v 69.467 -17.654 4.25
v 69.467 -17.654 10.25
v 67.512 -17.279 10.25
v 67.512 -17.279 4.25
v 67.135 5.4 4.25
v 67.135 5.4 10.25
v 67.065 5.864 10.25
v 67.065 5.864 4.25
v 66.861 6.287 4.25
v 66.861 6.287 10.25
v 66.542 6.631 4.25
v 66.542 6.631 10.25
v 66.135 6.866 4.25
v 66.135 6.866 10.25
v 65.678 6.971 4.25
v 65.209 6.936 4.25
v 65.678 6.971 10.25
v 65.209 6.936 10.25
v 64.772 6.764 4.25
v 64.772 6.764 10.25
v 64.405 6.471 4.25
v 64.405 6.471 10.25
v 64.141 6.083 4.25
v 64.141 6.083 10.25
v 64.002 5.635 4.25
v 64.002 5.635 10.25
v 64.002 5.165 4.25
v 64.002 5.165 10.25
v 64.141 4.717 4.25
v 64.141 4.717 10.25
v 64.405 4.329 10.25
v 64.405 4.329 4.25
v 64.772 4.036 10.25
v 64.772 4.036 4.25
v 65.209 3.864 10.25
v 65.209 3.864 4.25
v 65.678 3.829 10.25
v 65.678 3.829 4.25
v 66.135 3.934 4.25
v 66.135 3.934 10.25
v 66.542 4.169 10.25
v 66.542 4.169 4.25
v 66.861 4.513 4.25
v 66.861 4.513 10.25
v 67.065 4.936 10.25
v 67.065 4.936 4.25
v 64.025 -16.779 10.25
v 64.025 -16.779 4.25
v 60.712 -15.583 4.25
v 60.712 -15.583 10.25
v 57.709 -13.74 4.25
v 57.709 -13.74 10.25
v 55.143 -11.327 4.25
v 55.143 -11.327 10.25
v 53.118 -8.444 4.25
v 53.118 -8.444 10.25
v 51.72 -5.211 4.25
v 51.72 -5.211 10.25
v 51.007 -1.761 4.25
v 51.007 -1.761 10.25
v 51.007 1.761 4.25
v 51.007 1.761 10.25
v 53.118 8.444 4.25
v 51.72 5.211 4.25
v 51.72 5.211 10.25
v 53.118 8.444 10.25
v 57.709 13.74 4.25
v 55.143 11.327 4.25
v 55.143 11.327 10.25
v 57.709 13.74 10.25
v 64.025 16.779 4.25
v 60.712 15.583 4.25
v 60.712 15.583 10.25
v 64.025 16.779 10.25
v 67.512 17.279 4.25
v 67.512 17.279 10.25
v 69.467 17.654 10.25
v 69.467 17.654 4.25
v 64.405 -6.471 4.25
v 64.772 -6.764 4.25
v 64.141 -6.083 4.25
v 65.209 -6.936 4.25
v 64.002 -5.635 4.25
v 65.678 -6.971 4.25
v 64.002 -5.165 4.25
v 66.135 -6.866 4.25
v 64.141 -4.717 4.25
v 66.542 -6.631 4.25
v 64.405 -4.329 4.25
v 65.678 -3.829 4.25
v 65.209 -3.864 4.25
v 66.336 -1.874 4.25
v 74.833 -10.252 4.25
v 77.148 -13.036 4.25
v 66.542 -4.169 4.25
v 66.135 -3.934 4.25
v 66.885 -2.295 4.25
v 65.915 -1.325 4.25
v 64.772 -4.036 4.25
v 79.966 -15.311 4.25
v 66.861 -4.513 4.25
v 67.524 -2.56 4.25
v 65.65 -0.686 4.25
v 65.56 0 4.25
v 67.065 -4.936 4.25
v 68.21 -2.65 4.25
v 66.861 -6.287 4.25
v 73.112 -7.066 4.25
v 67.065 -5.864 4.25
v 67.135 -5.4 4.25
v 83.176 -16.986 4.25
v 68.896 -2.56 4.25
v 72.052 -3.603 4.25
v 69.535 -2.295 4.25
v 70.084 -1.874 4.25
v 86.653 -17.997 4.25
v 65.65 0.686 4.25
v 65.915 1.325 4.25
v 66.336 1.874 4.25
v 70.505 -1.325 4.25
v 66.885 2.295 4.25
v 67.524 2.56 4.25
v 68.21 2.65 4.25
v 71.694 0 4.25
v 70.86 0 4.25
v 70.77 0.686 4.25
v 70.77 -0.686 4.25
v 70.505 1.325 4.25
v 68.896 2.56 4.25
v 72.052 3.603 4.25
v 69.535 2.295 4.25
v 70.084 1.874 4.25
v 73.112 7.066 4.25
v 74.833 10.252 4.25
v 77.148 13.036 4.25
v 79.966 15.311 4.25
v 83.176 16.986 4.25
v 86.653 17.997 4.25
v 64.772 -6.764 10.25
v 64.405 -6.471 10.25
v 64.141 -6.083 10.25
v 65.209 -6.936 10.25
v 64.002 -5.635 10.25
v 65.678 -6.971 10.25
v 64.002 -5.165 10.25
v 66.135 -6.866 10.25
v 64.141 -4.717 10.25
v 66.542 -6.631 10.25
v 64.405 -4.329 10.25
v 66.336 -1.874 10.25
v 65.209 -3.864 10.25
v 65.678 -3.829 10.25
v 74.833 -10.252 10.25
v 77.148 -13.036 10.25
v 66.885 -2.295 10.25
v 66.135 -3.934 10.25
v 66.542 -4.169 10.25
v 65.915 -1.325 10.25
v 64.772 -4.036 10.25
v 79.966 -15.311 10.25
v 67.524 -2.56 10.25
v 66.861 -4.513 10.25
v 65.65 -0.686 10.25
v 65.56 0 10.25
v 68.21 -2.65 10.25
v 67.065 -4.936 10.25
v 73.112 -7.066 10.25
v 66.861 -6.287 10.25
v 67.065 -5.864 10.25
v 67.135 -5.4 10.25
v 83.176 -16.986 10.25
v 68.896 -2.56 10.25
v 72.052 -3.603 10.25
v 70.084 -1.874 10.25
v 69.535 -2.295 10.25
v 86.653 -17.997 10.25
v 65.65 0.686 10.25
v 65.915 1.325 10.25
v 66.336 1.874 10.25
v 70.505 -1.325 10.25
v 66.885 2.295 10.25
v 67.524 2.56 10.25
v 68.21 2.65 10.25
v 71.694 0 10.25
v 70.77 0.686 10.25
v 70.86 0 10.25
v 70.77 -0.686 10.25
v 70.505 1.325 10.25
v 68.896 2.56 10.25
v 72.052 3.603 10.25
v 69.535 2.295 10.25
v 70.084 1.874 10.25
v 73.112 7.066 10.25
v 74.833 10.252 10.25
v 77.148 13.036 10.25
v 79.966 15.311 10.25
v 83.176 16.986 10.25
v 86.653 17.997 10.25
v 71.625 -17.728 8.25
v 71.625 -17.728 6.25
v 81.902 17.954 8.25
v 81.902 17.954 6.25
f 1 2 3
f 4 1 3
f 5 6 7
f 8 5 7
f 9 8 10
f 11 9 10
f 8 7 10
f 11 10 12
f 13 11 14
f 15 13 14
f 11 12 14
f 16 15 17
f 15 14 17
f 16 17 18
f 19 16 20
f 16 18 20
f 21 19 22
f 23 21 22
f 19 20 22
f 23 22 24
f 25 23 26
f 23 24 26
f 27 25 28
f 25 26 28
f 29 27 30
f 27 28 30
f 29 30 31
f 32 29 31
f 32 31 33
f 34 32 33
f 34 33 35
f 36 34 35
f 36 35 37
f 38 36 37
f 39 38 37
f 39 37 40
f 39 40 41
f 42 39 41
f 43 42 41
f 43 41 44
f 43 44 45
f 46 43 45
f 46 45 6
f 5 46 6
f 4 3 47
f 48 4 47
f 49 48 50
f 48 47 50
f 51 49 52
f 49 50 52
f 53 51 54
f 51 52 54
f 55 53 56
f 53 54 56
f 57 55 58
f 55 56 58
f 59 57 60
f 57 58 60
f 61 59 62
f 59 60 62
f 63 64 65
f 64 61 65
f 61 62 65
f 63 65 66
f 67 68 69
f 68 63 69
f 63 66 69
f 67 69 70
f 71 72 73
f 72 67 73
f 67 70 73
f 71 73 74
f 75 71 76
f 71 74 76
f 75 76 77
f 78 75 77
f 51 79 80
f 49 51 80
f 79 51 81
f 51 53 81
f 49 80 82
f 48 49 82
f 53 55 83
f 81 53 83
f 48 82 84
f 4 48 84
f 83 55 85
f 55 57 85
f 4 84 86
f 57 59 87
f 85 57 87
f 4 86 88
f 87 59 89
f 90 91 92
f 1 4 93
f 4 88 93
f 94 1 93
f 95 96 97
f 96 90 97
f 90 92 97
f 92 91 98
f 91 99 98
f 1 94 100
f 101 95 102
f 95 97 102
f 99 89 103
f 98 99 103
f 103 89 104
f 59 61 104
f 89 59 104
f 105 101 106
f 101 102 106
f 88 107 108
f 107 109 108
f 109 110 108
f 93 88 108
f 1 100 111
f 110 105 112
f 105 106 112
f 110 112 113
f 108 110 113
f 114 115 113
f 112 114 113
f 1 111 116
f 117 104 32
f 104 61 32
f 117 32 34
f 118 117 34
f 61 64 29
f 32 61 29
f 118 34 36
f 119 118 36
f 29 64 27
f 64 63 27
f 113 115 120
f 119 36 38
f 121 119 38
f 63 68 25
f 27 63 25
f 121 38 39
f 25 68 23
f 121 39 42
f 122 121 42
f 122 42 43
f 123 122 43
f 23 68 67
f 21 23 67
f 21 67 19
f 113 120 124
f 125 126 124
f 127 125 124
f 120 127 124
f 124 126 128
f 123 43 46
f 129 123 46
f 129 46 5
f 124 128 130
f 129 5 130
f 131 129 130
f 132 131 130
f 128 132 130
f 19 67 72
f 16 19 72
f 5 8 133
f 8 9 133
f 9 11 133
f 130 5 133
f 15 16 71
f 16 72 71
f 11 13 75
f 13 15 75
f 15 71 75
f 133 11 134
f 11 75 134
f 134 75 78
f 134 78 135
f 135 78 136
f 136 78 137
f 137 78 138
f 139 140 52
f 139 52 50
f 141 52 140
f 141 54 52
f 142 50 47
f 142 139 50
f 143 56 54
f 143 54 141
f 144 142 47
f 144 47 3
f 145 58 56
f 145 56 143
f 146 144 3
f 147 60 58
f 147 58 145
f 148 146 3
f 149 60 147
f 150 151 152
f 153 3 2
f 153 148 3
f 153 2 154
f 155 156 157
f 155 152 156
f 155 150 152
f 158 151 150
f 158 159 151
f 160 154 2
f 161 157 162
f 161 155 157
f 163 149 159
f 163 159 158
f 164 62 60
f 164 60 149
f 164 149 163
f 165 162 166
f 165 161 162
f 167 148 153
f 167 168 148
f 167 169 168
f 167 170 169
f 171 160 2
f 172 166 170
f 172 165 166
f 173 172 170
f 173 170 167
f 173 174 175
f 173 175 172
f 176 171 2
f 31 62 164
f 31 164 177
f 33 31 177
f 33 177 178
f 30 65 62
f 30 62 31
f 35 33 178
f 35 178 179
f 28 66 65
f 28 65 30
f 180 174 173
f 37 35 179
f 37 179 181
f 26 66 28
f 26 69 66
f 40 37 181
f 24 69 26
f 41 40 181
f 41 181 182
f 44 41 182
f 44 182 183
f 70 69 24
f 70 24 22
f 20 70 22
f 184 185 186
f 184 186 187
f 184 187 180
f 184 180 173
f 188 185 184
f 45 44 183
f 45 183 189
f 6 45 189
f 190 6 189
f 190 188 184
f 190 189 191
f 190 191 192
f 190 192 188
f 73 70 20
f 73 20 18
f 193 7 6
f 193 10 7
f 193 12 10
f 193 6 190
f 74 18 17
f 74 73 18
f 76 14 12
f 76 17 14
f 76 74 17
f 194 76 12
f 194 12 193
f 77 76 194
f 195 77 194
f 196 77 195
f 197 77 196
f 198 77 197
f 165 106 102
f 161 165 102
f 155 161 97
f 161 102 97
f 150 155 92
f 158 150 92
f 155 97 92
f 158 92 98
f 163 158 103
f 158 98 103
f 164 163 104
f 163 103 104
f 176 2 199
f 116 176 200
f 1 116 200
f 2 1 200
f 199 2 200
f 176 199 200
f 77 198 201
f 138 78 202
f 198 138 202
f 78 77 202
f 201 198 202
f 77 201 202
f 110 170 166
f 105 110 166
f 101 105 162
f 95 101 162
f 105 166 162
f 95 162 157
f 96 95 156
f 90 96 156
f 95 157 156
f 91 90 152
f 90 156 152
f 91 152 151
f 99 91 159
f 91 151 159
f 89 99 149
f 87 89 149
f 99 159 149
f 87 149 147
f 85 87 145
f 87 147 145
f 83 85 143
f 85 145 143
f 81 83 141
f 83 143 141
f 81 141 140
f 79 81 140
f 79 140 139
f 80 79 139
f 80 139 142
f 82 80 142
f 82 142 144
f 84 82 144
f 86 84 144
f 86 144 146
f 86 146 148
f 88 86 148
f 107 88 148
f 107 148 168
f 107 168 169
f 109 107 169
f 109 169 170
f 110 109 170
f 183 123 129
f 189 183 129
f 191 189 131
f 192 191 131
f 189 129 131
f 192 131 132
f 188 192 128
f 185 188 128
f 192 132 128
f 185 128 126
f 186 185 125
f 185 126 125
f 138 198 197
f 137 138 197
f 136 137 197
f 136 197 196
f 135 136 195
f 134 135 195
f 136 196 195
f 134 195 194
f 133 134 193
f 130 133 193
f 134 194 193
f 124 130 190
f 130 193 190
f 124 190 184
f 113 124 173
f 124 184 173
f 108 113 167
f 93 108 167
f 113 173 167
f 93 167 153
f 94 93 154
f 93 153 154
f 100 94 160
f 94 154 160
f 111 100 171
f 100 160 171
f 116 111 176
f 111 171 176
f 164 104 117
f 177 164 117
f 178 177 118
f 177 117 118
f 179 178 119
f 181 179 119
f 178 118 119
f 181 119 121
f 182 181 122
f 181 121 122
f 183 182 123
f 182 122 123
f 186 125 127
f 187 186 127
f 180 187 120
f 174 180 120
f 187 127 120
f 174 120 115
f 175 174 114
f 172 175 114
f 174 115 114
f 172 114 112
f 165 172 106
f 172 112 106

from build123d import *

# Parameters (mm, degrees)
BOSS_EXTRUDE5_START = 4.25
BOSS_EXTRUDE5_DEPTH = 6
CUT_EXTRUDE2_DEPTH  = 92.979276087
SKETCH4_R           = 1.575
CUT_EXTRUDE3_DEPTH  = 10


with BuildPart() as part:
    # Sketch2 → Boss-Extrude5 (new body)
    with BuildSketch(Plane.XY.offset(BOSS_EXTRUDE5_START)):
        with BuildLine():
            ThreePointArc((68.209851787, 17.593254842), (67.854853617, 17.589672886), (67.5, 17.578928476))
            ThreePointArc((67.5, 17.578928476), (61.469163108, 16.250714817), (56.268821721, 12.920310248))
            ThreePointArc((56.268821721, 12.920310248), (61.039234507, 7.227490774), (62.750493933, 0))
            Line((62.750493933, 0), (65.559851787, 0))
            ThreePointArc((65.559851787, 0), (66.336018817, 1.87383297), (68.209851787, 2.65))
            Line((68.209851787, 2.65), (68.209851787, 17.593254842))
        make_face()
        with BuildLine():
            ThreePointArc((56.268821721, -12.920310248), (61.469163108, -16.250714817), (67.5, -17.578928476))
            ThreePointArc((67.5, -17.578928476), (67.854853617, -17.589672886), (68.209851787, -17.593254842))
            Line((68.209851787, -17.593254842), (68.209851787, -2.65))
            ThreePointArc((68.209851787, -2.65), (66.336018817, -1.87383297), (65.559851787, 0))
            Line((65.559851787, 0), (62.750493933, 0))
            ThreePointArc((62.750493933, 0), (61.039234507, -7.227490774), (56.268821721, -12.920310248))
        make_face()
        with BuildLine():
            ThreePointArc((62.750493933, 0), (61.039234507, 7.227490774), (56.268821721, 12.920310248))
            ThreePointArc((56.268821721, 12.920310248), (52.091474062, 7.051277576), (50.616596945, 0))
            Line((50.616596945, 0), (62.750493933, 0))
        make_face()
        with BuildLine():
            ThreePointArc((50.616596945, 0), (52.091474062, -7.051277576), (56.268821721, -12.920310248))
            ThreePointArc((56.268821721, -12.920310248), (61.039234507, -7.227490774), (62.750493933, 0))
            Line((62.750493933, 0), (50.616596945, 0))
        make_face()
        with BuildLine():
            ThreePointArc((62.750493933, 0), (61.039234507, 7.227490774), (56.268821721, 12.920310248))
            ThreePointArc((56.268821721, 12.920310248), (52.091474062, 7.051277576), (50.616596945, 0))
            Line((50.616596945, 0), (62.750493933, 0))
        make_face()
        with BuildLine():
            ThreePointArc((50.616596945, 0), (52.091474062, -7.051277576), (56.268821721, -12.920310248))
            ThreePointArc((56.268821721, -12.920310248), (61.039234507, -7.227490774), (62.750493933, 0))
            Line((62.750493933, 0), (50.616596945, 0))
        make_face()
        with BuildLine():
            ThreePointArc((68.209851787, 17.593254842), (67.854853617, 17.589672886), (67.5, 17.578928476))
            ThreePointArc((67.5, 17.578928476), (61.469163108, 16.250714817), (56.268821721, 12.920310248))
            ThreePointArc((56.268821721, 12.920310248), (61.039234507, 7.227490774), (62.750493933, 0))
            Line((62.750493933, 0), (65.559851787, 0))
            ThreePointArc((65.559851787, 0), (66.336018817, 1.87383297), (68.209851787, 2.65))
            Line((68.209851787, 2.65), (68.209851787, 17.593254842))
        make_face()
        with BuildLine():
            ThreePointArc((56.268821721, -12.920310248), (61.469163108, -16.250714817), (67.5, -17.578928476))
            ThreePointArc((67.5, -17.578928476), (67.854853617, -17.589672886), (68.209851787, -17.593254842))
            Line((68.209851787, -17.593254842), (68.209851787, -2.65))
            ThreePointArc((68.209851787, -2.65), (66.336018817, -1.87383297), (65.559851787, 0))
            Line((65.559851787, 0), (62.750493933, 0))
            ThreePointArc((62.750493933, 0), (61.039234507, -7.227490774), (56.268821721, -12.920310248))
        make_face()
        with BuildLine():
            ThreePointArc((78.767770494, 14.073129307), (73.774493088, 16.69003844), (68.209851787, 17.593254842))
            Line((68.209851787, 17.593254842), (68.209851787, 2.65))
            ThreePointArc((68.209851787, 2.65), (70.083684757, 1.87383297), (70.859851787, 0))
            Line((70.859851787, 0), (71.993520086, 0))
            ThreePointArc((71.993520086, 0), (73.775238341, 7.809344356), (78.767770494, 14.073129307))
        make_face()
        with BuildLine():
            Line((68.209851787, -2.65), (68.209851787, -17.593254842))
            ThreePointArc((68.209851787, -17.593254842), (73.774493088, -16.69003844), (78.767770494, -14.073129307))
            ThreePointArc((78.767770494, -14.073129307), (73.775238341, -7.809344356), (71.993520086, 0))
            Line((71.993520086, 0), (70.859851787, 0))
            ThreePointArc((70.859851787, 0), (70.083684757, -1.87383297), (68.209851787, -2.65))
        make_face()
        with BuildLine():
            ThreePointArc((78.767770494, 14.073129307), (73.774493088, 16.69003844), (68.209851787, 17.593254842))
            Line((68.209851787, 17.593254842), (68.209851787, 2.65))
            ThreePointArc((68.209851787, 2.65), (70.083684757, 1.87383297), (70.859851787, 0))
            Line((70.859851787, 0), (71.993520086, 0))
            ThreePointArc((71.993520086, 0), (73.775238341, 7.809344356), (78.767770494, 14.073129307))
        make_face()
        with BuildLine():
            Line((68.209851787, -2.65), (68.209851787, -17.593254842))
            ThreePointArc((68.209851787, -17.593254842), (73.774493088, -16.69003844), (78.767770494, -14.073129307))
            ThreePointArc((78.767770494, -14.073129307), (73.775238341, -7.809344356), (71.993520086, 0))
            Line((71.993520086, 0), (70.859851787, 0))
            ThreePointArc((70.859851787, 0), (70.083684757, -1.87383297), (68.209851787, -2.65))
        make_face()
        with BuildLine():
            add(Edge.make_bspline(
                [(90, 18.005197753), (87.300427685, 18.005389985), (81.17457593, 17.968478919), (73.674128402, 17.806885767), (68.874876564, 17.634447138), (67.5, 17.578928476)],
                knots=[0.344744853, 0.344744853, 0.344744853, 0.344744853, 0.357984483, 0.374788114, 0.381536428, 0.381536428, 0.381536428, 0.381536428], degree=3))
            ThreePointArc((67.5, 17.578928476), (67.854853617, 17.589672886), (68.209851787, 17.593254842))
            ThreePointArc((68.209851787, 17.593254842), (73.774493088, 16.69003844), (78.767770494, 14.073129307))
            ThreePointArc((78.767770494, 14.073129307), (84.049630886, 16.993984573), (90, 18.005197753))
        make_face()
        with BuildLine():
            ThreePointArc((68.209851787, -17.593254842), (67.854853617, -17.589672886), (67.5, -17.578928476))
            add(Edge.make_bspline(
                [(67.5, -17.578928476), (68.874876564, -17.634447138), (73.674128402, -17.806885767), (81.17457593, -17.968478919), (87.300427685, -18.005389985), (90, -18.005197753)],
                knots=[0.618463572, 0.618463572, 0.618463572, 0.618463572, 0.625211886, 0.642015517, 0.655255147, 0.655255147, 0.655255147, 0.655255147], degree=3))
            ThreePointArc((90, -18.005197753), (84.049630886, -16.993984573), (78.767770494, -14.073129307))
            ThreePointArc((78.767770494, -14.073129307), (73.774493088, -16.69003844), (68.209851787, -17.593254842))
        make_face()
        with BuildLine():
            add(Edge.make_bspline(
                [(90, 18.005197753), (87.300427685, 18.005389985), (81.17457593, 17.968478919), (73.674128402, 17.806885767), (68.874876564, 17.634447138), (67.5, 17.578928476)],
                knots=[0.344744853, 0.344744853, 0.344744853, 0.344744853, 0.357984483, 0.374788114, 0.381536428, 0.381536428, 0.381536428, 0.381536428], degree=3))
            ThreePointArc((67.5, 17.578928476), (67.854853617, 17.589672886), (68.209851787, 17.593254842))
            ThreePointArc((68.209851787, 17.593254842), (73.774493088, 16.69003844), (78.767770494, 14.073129307))
            ThreePointArc((78.767770494, 14.073129307), (84.049630886, 16.993984573), (90, 18.005197753))
        make_face()
        with BuildLine():
            ThreePointArc((68.209851787, -17.593254842), (67.854853617, -17.589672886), (67.5, -17.578928476))
            add(Edge.make_bspline(
                [(67.5, -17.578928476), (68.874876564, -17.634447138), (73.674128402, -17.806885767), (81.17457593, -17.968478919), (87.300427685, -18.005389985), (90, -18.005197753)],
                knots=[0.618463572, 0.618463572, 0.618463572, 0.618463572, 0.625211886, 0.642015517, 0.655255147, 0.655255147, 0.655255147, 0.655255147], degree=3))
            ThreePointArc((90, -18.005197753), (84.049630886, -16.993984573), (78.767770494, -14.073129307))
            ThreePointArc((78.767770494, -14.073129307), (73.774493088, -16.69003844), (68.209851787, -17.593254842))
        make_face()
    extrude(amount=BOSS_EXTRUDE5_DEPTH)

    # Sketch3 → Cut-Extrude2 (cut, through all)
    with BuildSketch(Plane.XY.offset(10.25)):
        with BuildLine():
            ThreePointArc((67.512104385, -17.279172769), (50.916596945, 0), (67.512104385, 17.279172769))
            Line((67.512104385, 17.279172769), (69.466542011, 17.654214769))
            add(Edge.make_bspline(
                [(69.466542011, 17.654214769), (68.810976965, 17.630475848), (68.155460296, 17.605396509), (67.5, 17.578928476)],
                knots=[0.378319229, 0.378319229, 0.378319229, 0.378319229, 0.381536428, 0.381536428, 0.381536428, 0.381536428], degree=3))
            ThreePointArc((67.5, 17.578928476), (50.616596945, 0), (67.5, -17.578928476))
            add(Edge.make_bspline(
                [(67.5, -17.578928476), (68.155460296, -17.605396509), (68.810976965, -17.630475848), (69.466542011, -17.654214769)],
                knots=[0.618463572, 0.618463572, 0.618463572, 0.618463572, 0.621680771, 0.621680771, 0.621680771, 0.621680771], degree=3))
            Line((69.466542011, -17.654214769), (67.512104385, -17.279172769))
        make_face()
        with BuildLine():
            add(Edge.make_bspline(
                [(90, 18.005197753), (88.88435893, 18.005277196), (87.768717531, 18.00254573), (86.653091523, 17.996862246)],
                knots=[0.344744853, 0.344744853, 0.344744853, 0.344744853, 0.35021634, 0.35021634, 0.35021634, 0.35021634], degree=3))
            ThreePointArc((86.653091523, 17.996862246), (71.693520086, 0), (86.653091523, -17.996862246))
            add(Edge.make_bspline(
                [(86.653091523, -17.996862246), (87.768717531, -18.00254573), (88.88435893, -18.005277196), (90, -18.005197753)],
                knots=[0.64978366, 0.64978366, 0.64978366, 0.64978366, 0.655255147, 0.655255147, 0.655255147, 0.655255147], degree=3))
            ThreePointArc((90, -18.005197753), (71.993520086, 0), (90, 18.005197753))
        make_face()
    extrude(amount=-CUT_EXTRUDE2_DEPTH, mode=Mode.SUBTRACT)

    # Sketch4 → Cut-Extrude3 (cut)
    with BuildSketch(Plane.XY.offset(10.25)):
        with Locations((65.559851787, 5.4)):
            Circle(SKETCH4_R)
        with Locations((65.559851787, -5.4)):
            Circle(SKETCH4_R)
    extrude(amount=-CUT_EXTRUDE3_DEPTH, mode=Mode.SUBTRACT)


solid = part.part
